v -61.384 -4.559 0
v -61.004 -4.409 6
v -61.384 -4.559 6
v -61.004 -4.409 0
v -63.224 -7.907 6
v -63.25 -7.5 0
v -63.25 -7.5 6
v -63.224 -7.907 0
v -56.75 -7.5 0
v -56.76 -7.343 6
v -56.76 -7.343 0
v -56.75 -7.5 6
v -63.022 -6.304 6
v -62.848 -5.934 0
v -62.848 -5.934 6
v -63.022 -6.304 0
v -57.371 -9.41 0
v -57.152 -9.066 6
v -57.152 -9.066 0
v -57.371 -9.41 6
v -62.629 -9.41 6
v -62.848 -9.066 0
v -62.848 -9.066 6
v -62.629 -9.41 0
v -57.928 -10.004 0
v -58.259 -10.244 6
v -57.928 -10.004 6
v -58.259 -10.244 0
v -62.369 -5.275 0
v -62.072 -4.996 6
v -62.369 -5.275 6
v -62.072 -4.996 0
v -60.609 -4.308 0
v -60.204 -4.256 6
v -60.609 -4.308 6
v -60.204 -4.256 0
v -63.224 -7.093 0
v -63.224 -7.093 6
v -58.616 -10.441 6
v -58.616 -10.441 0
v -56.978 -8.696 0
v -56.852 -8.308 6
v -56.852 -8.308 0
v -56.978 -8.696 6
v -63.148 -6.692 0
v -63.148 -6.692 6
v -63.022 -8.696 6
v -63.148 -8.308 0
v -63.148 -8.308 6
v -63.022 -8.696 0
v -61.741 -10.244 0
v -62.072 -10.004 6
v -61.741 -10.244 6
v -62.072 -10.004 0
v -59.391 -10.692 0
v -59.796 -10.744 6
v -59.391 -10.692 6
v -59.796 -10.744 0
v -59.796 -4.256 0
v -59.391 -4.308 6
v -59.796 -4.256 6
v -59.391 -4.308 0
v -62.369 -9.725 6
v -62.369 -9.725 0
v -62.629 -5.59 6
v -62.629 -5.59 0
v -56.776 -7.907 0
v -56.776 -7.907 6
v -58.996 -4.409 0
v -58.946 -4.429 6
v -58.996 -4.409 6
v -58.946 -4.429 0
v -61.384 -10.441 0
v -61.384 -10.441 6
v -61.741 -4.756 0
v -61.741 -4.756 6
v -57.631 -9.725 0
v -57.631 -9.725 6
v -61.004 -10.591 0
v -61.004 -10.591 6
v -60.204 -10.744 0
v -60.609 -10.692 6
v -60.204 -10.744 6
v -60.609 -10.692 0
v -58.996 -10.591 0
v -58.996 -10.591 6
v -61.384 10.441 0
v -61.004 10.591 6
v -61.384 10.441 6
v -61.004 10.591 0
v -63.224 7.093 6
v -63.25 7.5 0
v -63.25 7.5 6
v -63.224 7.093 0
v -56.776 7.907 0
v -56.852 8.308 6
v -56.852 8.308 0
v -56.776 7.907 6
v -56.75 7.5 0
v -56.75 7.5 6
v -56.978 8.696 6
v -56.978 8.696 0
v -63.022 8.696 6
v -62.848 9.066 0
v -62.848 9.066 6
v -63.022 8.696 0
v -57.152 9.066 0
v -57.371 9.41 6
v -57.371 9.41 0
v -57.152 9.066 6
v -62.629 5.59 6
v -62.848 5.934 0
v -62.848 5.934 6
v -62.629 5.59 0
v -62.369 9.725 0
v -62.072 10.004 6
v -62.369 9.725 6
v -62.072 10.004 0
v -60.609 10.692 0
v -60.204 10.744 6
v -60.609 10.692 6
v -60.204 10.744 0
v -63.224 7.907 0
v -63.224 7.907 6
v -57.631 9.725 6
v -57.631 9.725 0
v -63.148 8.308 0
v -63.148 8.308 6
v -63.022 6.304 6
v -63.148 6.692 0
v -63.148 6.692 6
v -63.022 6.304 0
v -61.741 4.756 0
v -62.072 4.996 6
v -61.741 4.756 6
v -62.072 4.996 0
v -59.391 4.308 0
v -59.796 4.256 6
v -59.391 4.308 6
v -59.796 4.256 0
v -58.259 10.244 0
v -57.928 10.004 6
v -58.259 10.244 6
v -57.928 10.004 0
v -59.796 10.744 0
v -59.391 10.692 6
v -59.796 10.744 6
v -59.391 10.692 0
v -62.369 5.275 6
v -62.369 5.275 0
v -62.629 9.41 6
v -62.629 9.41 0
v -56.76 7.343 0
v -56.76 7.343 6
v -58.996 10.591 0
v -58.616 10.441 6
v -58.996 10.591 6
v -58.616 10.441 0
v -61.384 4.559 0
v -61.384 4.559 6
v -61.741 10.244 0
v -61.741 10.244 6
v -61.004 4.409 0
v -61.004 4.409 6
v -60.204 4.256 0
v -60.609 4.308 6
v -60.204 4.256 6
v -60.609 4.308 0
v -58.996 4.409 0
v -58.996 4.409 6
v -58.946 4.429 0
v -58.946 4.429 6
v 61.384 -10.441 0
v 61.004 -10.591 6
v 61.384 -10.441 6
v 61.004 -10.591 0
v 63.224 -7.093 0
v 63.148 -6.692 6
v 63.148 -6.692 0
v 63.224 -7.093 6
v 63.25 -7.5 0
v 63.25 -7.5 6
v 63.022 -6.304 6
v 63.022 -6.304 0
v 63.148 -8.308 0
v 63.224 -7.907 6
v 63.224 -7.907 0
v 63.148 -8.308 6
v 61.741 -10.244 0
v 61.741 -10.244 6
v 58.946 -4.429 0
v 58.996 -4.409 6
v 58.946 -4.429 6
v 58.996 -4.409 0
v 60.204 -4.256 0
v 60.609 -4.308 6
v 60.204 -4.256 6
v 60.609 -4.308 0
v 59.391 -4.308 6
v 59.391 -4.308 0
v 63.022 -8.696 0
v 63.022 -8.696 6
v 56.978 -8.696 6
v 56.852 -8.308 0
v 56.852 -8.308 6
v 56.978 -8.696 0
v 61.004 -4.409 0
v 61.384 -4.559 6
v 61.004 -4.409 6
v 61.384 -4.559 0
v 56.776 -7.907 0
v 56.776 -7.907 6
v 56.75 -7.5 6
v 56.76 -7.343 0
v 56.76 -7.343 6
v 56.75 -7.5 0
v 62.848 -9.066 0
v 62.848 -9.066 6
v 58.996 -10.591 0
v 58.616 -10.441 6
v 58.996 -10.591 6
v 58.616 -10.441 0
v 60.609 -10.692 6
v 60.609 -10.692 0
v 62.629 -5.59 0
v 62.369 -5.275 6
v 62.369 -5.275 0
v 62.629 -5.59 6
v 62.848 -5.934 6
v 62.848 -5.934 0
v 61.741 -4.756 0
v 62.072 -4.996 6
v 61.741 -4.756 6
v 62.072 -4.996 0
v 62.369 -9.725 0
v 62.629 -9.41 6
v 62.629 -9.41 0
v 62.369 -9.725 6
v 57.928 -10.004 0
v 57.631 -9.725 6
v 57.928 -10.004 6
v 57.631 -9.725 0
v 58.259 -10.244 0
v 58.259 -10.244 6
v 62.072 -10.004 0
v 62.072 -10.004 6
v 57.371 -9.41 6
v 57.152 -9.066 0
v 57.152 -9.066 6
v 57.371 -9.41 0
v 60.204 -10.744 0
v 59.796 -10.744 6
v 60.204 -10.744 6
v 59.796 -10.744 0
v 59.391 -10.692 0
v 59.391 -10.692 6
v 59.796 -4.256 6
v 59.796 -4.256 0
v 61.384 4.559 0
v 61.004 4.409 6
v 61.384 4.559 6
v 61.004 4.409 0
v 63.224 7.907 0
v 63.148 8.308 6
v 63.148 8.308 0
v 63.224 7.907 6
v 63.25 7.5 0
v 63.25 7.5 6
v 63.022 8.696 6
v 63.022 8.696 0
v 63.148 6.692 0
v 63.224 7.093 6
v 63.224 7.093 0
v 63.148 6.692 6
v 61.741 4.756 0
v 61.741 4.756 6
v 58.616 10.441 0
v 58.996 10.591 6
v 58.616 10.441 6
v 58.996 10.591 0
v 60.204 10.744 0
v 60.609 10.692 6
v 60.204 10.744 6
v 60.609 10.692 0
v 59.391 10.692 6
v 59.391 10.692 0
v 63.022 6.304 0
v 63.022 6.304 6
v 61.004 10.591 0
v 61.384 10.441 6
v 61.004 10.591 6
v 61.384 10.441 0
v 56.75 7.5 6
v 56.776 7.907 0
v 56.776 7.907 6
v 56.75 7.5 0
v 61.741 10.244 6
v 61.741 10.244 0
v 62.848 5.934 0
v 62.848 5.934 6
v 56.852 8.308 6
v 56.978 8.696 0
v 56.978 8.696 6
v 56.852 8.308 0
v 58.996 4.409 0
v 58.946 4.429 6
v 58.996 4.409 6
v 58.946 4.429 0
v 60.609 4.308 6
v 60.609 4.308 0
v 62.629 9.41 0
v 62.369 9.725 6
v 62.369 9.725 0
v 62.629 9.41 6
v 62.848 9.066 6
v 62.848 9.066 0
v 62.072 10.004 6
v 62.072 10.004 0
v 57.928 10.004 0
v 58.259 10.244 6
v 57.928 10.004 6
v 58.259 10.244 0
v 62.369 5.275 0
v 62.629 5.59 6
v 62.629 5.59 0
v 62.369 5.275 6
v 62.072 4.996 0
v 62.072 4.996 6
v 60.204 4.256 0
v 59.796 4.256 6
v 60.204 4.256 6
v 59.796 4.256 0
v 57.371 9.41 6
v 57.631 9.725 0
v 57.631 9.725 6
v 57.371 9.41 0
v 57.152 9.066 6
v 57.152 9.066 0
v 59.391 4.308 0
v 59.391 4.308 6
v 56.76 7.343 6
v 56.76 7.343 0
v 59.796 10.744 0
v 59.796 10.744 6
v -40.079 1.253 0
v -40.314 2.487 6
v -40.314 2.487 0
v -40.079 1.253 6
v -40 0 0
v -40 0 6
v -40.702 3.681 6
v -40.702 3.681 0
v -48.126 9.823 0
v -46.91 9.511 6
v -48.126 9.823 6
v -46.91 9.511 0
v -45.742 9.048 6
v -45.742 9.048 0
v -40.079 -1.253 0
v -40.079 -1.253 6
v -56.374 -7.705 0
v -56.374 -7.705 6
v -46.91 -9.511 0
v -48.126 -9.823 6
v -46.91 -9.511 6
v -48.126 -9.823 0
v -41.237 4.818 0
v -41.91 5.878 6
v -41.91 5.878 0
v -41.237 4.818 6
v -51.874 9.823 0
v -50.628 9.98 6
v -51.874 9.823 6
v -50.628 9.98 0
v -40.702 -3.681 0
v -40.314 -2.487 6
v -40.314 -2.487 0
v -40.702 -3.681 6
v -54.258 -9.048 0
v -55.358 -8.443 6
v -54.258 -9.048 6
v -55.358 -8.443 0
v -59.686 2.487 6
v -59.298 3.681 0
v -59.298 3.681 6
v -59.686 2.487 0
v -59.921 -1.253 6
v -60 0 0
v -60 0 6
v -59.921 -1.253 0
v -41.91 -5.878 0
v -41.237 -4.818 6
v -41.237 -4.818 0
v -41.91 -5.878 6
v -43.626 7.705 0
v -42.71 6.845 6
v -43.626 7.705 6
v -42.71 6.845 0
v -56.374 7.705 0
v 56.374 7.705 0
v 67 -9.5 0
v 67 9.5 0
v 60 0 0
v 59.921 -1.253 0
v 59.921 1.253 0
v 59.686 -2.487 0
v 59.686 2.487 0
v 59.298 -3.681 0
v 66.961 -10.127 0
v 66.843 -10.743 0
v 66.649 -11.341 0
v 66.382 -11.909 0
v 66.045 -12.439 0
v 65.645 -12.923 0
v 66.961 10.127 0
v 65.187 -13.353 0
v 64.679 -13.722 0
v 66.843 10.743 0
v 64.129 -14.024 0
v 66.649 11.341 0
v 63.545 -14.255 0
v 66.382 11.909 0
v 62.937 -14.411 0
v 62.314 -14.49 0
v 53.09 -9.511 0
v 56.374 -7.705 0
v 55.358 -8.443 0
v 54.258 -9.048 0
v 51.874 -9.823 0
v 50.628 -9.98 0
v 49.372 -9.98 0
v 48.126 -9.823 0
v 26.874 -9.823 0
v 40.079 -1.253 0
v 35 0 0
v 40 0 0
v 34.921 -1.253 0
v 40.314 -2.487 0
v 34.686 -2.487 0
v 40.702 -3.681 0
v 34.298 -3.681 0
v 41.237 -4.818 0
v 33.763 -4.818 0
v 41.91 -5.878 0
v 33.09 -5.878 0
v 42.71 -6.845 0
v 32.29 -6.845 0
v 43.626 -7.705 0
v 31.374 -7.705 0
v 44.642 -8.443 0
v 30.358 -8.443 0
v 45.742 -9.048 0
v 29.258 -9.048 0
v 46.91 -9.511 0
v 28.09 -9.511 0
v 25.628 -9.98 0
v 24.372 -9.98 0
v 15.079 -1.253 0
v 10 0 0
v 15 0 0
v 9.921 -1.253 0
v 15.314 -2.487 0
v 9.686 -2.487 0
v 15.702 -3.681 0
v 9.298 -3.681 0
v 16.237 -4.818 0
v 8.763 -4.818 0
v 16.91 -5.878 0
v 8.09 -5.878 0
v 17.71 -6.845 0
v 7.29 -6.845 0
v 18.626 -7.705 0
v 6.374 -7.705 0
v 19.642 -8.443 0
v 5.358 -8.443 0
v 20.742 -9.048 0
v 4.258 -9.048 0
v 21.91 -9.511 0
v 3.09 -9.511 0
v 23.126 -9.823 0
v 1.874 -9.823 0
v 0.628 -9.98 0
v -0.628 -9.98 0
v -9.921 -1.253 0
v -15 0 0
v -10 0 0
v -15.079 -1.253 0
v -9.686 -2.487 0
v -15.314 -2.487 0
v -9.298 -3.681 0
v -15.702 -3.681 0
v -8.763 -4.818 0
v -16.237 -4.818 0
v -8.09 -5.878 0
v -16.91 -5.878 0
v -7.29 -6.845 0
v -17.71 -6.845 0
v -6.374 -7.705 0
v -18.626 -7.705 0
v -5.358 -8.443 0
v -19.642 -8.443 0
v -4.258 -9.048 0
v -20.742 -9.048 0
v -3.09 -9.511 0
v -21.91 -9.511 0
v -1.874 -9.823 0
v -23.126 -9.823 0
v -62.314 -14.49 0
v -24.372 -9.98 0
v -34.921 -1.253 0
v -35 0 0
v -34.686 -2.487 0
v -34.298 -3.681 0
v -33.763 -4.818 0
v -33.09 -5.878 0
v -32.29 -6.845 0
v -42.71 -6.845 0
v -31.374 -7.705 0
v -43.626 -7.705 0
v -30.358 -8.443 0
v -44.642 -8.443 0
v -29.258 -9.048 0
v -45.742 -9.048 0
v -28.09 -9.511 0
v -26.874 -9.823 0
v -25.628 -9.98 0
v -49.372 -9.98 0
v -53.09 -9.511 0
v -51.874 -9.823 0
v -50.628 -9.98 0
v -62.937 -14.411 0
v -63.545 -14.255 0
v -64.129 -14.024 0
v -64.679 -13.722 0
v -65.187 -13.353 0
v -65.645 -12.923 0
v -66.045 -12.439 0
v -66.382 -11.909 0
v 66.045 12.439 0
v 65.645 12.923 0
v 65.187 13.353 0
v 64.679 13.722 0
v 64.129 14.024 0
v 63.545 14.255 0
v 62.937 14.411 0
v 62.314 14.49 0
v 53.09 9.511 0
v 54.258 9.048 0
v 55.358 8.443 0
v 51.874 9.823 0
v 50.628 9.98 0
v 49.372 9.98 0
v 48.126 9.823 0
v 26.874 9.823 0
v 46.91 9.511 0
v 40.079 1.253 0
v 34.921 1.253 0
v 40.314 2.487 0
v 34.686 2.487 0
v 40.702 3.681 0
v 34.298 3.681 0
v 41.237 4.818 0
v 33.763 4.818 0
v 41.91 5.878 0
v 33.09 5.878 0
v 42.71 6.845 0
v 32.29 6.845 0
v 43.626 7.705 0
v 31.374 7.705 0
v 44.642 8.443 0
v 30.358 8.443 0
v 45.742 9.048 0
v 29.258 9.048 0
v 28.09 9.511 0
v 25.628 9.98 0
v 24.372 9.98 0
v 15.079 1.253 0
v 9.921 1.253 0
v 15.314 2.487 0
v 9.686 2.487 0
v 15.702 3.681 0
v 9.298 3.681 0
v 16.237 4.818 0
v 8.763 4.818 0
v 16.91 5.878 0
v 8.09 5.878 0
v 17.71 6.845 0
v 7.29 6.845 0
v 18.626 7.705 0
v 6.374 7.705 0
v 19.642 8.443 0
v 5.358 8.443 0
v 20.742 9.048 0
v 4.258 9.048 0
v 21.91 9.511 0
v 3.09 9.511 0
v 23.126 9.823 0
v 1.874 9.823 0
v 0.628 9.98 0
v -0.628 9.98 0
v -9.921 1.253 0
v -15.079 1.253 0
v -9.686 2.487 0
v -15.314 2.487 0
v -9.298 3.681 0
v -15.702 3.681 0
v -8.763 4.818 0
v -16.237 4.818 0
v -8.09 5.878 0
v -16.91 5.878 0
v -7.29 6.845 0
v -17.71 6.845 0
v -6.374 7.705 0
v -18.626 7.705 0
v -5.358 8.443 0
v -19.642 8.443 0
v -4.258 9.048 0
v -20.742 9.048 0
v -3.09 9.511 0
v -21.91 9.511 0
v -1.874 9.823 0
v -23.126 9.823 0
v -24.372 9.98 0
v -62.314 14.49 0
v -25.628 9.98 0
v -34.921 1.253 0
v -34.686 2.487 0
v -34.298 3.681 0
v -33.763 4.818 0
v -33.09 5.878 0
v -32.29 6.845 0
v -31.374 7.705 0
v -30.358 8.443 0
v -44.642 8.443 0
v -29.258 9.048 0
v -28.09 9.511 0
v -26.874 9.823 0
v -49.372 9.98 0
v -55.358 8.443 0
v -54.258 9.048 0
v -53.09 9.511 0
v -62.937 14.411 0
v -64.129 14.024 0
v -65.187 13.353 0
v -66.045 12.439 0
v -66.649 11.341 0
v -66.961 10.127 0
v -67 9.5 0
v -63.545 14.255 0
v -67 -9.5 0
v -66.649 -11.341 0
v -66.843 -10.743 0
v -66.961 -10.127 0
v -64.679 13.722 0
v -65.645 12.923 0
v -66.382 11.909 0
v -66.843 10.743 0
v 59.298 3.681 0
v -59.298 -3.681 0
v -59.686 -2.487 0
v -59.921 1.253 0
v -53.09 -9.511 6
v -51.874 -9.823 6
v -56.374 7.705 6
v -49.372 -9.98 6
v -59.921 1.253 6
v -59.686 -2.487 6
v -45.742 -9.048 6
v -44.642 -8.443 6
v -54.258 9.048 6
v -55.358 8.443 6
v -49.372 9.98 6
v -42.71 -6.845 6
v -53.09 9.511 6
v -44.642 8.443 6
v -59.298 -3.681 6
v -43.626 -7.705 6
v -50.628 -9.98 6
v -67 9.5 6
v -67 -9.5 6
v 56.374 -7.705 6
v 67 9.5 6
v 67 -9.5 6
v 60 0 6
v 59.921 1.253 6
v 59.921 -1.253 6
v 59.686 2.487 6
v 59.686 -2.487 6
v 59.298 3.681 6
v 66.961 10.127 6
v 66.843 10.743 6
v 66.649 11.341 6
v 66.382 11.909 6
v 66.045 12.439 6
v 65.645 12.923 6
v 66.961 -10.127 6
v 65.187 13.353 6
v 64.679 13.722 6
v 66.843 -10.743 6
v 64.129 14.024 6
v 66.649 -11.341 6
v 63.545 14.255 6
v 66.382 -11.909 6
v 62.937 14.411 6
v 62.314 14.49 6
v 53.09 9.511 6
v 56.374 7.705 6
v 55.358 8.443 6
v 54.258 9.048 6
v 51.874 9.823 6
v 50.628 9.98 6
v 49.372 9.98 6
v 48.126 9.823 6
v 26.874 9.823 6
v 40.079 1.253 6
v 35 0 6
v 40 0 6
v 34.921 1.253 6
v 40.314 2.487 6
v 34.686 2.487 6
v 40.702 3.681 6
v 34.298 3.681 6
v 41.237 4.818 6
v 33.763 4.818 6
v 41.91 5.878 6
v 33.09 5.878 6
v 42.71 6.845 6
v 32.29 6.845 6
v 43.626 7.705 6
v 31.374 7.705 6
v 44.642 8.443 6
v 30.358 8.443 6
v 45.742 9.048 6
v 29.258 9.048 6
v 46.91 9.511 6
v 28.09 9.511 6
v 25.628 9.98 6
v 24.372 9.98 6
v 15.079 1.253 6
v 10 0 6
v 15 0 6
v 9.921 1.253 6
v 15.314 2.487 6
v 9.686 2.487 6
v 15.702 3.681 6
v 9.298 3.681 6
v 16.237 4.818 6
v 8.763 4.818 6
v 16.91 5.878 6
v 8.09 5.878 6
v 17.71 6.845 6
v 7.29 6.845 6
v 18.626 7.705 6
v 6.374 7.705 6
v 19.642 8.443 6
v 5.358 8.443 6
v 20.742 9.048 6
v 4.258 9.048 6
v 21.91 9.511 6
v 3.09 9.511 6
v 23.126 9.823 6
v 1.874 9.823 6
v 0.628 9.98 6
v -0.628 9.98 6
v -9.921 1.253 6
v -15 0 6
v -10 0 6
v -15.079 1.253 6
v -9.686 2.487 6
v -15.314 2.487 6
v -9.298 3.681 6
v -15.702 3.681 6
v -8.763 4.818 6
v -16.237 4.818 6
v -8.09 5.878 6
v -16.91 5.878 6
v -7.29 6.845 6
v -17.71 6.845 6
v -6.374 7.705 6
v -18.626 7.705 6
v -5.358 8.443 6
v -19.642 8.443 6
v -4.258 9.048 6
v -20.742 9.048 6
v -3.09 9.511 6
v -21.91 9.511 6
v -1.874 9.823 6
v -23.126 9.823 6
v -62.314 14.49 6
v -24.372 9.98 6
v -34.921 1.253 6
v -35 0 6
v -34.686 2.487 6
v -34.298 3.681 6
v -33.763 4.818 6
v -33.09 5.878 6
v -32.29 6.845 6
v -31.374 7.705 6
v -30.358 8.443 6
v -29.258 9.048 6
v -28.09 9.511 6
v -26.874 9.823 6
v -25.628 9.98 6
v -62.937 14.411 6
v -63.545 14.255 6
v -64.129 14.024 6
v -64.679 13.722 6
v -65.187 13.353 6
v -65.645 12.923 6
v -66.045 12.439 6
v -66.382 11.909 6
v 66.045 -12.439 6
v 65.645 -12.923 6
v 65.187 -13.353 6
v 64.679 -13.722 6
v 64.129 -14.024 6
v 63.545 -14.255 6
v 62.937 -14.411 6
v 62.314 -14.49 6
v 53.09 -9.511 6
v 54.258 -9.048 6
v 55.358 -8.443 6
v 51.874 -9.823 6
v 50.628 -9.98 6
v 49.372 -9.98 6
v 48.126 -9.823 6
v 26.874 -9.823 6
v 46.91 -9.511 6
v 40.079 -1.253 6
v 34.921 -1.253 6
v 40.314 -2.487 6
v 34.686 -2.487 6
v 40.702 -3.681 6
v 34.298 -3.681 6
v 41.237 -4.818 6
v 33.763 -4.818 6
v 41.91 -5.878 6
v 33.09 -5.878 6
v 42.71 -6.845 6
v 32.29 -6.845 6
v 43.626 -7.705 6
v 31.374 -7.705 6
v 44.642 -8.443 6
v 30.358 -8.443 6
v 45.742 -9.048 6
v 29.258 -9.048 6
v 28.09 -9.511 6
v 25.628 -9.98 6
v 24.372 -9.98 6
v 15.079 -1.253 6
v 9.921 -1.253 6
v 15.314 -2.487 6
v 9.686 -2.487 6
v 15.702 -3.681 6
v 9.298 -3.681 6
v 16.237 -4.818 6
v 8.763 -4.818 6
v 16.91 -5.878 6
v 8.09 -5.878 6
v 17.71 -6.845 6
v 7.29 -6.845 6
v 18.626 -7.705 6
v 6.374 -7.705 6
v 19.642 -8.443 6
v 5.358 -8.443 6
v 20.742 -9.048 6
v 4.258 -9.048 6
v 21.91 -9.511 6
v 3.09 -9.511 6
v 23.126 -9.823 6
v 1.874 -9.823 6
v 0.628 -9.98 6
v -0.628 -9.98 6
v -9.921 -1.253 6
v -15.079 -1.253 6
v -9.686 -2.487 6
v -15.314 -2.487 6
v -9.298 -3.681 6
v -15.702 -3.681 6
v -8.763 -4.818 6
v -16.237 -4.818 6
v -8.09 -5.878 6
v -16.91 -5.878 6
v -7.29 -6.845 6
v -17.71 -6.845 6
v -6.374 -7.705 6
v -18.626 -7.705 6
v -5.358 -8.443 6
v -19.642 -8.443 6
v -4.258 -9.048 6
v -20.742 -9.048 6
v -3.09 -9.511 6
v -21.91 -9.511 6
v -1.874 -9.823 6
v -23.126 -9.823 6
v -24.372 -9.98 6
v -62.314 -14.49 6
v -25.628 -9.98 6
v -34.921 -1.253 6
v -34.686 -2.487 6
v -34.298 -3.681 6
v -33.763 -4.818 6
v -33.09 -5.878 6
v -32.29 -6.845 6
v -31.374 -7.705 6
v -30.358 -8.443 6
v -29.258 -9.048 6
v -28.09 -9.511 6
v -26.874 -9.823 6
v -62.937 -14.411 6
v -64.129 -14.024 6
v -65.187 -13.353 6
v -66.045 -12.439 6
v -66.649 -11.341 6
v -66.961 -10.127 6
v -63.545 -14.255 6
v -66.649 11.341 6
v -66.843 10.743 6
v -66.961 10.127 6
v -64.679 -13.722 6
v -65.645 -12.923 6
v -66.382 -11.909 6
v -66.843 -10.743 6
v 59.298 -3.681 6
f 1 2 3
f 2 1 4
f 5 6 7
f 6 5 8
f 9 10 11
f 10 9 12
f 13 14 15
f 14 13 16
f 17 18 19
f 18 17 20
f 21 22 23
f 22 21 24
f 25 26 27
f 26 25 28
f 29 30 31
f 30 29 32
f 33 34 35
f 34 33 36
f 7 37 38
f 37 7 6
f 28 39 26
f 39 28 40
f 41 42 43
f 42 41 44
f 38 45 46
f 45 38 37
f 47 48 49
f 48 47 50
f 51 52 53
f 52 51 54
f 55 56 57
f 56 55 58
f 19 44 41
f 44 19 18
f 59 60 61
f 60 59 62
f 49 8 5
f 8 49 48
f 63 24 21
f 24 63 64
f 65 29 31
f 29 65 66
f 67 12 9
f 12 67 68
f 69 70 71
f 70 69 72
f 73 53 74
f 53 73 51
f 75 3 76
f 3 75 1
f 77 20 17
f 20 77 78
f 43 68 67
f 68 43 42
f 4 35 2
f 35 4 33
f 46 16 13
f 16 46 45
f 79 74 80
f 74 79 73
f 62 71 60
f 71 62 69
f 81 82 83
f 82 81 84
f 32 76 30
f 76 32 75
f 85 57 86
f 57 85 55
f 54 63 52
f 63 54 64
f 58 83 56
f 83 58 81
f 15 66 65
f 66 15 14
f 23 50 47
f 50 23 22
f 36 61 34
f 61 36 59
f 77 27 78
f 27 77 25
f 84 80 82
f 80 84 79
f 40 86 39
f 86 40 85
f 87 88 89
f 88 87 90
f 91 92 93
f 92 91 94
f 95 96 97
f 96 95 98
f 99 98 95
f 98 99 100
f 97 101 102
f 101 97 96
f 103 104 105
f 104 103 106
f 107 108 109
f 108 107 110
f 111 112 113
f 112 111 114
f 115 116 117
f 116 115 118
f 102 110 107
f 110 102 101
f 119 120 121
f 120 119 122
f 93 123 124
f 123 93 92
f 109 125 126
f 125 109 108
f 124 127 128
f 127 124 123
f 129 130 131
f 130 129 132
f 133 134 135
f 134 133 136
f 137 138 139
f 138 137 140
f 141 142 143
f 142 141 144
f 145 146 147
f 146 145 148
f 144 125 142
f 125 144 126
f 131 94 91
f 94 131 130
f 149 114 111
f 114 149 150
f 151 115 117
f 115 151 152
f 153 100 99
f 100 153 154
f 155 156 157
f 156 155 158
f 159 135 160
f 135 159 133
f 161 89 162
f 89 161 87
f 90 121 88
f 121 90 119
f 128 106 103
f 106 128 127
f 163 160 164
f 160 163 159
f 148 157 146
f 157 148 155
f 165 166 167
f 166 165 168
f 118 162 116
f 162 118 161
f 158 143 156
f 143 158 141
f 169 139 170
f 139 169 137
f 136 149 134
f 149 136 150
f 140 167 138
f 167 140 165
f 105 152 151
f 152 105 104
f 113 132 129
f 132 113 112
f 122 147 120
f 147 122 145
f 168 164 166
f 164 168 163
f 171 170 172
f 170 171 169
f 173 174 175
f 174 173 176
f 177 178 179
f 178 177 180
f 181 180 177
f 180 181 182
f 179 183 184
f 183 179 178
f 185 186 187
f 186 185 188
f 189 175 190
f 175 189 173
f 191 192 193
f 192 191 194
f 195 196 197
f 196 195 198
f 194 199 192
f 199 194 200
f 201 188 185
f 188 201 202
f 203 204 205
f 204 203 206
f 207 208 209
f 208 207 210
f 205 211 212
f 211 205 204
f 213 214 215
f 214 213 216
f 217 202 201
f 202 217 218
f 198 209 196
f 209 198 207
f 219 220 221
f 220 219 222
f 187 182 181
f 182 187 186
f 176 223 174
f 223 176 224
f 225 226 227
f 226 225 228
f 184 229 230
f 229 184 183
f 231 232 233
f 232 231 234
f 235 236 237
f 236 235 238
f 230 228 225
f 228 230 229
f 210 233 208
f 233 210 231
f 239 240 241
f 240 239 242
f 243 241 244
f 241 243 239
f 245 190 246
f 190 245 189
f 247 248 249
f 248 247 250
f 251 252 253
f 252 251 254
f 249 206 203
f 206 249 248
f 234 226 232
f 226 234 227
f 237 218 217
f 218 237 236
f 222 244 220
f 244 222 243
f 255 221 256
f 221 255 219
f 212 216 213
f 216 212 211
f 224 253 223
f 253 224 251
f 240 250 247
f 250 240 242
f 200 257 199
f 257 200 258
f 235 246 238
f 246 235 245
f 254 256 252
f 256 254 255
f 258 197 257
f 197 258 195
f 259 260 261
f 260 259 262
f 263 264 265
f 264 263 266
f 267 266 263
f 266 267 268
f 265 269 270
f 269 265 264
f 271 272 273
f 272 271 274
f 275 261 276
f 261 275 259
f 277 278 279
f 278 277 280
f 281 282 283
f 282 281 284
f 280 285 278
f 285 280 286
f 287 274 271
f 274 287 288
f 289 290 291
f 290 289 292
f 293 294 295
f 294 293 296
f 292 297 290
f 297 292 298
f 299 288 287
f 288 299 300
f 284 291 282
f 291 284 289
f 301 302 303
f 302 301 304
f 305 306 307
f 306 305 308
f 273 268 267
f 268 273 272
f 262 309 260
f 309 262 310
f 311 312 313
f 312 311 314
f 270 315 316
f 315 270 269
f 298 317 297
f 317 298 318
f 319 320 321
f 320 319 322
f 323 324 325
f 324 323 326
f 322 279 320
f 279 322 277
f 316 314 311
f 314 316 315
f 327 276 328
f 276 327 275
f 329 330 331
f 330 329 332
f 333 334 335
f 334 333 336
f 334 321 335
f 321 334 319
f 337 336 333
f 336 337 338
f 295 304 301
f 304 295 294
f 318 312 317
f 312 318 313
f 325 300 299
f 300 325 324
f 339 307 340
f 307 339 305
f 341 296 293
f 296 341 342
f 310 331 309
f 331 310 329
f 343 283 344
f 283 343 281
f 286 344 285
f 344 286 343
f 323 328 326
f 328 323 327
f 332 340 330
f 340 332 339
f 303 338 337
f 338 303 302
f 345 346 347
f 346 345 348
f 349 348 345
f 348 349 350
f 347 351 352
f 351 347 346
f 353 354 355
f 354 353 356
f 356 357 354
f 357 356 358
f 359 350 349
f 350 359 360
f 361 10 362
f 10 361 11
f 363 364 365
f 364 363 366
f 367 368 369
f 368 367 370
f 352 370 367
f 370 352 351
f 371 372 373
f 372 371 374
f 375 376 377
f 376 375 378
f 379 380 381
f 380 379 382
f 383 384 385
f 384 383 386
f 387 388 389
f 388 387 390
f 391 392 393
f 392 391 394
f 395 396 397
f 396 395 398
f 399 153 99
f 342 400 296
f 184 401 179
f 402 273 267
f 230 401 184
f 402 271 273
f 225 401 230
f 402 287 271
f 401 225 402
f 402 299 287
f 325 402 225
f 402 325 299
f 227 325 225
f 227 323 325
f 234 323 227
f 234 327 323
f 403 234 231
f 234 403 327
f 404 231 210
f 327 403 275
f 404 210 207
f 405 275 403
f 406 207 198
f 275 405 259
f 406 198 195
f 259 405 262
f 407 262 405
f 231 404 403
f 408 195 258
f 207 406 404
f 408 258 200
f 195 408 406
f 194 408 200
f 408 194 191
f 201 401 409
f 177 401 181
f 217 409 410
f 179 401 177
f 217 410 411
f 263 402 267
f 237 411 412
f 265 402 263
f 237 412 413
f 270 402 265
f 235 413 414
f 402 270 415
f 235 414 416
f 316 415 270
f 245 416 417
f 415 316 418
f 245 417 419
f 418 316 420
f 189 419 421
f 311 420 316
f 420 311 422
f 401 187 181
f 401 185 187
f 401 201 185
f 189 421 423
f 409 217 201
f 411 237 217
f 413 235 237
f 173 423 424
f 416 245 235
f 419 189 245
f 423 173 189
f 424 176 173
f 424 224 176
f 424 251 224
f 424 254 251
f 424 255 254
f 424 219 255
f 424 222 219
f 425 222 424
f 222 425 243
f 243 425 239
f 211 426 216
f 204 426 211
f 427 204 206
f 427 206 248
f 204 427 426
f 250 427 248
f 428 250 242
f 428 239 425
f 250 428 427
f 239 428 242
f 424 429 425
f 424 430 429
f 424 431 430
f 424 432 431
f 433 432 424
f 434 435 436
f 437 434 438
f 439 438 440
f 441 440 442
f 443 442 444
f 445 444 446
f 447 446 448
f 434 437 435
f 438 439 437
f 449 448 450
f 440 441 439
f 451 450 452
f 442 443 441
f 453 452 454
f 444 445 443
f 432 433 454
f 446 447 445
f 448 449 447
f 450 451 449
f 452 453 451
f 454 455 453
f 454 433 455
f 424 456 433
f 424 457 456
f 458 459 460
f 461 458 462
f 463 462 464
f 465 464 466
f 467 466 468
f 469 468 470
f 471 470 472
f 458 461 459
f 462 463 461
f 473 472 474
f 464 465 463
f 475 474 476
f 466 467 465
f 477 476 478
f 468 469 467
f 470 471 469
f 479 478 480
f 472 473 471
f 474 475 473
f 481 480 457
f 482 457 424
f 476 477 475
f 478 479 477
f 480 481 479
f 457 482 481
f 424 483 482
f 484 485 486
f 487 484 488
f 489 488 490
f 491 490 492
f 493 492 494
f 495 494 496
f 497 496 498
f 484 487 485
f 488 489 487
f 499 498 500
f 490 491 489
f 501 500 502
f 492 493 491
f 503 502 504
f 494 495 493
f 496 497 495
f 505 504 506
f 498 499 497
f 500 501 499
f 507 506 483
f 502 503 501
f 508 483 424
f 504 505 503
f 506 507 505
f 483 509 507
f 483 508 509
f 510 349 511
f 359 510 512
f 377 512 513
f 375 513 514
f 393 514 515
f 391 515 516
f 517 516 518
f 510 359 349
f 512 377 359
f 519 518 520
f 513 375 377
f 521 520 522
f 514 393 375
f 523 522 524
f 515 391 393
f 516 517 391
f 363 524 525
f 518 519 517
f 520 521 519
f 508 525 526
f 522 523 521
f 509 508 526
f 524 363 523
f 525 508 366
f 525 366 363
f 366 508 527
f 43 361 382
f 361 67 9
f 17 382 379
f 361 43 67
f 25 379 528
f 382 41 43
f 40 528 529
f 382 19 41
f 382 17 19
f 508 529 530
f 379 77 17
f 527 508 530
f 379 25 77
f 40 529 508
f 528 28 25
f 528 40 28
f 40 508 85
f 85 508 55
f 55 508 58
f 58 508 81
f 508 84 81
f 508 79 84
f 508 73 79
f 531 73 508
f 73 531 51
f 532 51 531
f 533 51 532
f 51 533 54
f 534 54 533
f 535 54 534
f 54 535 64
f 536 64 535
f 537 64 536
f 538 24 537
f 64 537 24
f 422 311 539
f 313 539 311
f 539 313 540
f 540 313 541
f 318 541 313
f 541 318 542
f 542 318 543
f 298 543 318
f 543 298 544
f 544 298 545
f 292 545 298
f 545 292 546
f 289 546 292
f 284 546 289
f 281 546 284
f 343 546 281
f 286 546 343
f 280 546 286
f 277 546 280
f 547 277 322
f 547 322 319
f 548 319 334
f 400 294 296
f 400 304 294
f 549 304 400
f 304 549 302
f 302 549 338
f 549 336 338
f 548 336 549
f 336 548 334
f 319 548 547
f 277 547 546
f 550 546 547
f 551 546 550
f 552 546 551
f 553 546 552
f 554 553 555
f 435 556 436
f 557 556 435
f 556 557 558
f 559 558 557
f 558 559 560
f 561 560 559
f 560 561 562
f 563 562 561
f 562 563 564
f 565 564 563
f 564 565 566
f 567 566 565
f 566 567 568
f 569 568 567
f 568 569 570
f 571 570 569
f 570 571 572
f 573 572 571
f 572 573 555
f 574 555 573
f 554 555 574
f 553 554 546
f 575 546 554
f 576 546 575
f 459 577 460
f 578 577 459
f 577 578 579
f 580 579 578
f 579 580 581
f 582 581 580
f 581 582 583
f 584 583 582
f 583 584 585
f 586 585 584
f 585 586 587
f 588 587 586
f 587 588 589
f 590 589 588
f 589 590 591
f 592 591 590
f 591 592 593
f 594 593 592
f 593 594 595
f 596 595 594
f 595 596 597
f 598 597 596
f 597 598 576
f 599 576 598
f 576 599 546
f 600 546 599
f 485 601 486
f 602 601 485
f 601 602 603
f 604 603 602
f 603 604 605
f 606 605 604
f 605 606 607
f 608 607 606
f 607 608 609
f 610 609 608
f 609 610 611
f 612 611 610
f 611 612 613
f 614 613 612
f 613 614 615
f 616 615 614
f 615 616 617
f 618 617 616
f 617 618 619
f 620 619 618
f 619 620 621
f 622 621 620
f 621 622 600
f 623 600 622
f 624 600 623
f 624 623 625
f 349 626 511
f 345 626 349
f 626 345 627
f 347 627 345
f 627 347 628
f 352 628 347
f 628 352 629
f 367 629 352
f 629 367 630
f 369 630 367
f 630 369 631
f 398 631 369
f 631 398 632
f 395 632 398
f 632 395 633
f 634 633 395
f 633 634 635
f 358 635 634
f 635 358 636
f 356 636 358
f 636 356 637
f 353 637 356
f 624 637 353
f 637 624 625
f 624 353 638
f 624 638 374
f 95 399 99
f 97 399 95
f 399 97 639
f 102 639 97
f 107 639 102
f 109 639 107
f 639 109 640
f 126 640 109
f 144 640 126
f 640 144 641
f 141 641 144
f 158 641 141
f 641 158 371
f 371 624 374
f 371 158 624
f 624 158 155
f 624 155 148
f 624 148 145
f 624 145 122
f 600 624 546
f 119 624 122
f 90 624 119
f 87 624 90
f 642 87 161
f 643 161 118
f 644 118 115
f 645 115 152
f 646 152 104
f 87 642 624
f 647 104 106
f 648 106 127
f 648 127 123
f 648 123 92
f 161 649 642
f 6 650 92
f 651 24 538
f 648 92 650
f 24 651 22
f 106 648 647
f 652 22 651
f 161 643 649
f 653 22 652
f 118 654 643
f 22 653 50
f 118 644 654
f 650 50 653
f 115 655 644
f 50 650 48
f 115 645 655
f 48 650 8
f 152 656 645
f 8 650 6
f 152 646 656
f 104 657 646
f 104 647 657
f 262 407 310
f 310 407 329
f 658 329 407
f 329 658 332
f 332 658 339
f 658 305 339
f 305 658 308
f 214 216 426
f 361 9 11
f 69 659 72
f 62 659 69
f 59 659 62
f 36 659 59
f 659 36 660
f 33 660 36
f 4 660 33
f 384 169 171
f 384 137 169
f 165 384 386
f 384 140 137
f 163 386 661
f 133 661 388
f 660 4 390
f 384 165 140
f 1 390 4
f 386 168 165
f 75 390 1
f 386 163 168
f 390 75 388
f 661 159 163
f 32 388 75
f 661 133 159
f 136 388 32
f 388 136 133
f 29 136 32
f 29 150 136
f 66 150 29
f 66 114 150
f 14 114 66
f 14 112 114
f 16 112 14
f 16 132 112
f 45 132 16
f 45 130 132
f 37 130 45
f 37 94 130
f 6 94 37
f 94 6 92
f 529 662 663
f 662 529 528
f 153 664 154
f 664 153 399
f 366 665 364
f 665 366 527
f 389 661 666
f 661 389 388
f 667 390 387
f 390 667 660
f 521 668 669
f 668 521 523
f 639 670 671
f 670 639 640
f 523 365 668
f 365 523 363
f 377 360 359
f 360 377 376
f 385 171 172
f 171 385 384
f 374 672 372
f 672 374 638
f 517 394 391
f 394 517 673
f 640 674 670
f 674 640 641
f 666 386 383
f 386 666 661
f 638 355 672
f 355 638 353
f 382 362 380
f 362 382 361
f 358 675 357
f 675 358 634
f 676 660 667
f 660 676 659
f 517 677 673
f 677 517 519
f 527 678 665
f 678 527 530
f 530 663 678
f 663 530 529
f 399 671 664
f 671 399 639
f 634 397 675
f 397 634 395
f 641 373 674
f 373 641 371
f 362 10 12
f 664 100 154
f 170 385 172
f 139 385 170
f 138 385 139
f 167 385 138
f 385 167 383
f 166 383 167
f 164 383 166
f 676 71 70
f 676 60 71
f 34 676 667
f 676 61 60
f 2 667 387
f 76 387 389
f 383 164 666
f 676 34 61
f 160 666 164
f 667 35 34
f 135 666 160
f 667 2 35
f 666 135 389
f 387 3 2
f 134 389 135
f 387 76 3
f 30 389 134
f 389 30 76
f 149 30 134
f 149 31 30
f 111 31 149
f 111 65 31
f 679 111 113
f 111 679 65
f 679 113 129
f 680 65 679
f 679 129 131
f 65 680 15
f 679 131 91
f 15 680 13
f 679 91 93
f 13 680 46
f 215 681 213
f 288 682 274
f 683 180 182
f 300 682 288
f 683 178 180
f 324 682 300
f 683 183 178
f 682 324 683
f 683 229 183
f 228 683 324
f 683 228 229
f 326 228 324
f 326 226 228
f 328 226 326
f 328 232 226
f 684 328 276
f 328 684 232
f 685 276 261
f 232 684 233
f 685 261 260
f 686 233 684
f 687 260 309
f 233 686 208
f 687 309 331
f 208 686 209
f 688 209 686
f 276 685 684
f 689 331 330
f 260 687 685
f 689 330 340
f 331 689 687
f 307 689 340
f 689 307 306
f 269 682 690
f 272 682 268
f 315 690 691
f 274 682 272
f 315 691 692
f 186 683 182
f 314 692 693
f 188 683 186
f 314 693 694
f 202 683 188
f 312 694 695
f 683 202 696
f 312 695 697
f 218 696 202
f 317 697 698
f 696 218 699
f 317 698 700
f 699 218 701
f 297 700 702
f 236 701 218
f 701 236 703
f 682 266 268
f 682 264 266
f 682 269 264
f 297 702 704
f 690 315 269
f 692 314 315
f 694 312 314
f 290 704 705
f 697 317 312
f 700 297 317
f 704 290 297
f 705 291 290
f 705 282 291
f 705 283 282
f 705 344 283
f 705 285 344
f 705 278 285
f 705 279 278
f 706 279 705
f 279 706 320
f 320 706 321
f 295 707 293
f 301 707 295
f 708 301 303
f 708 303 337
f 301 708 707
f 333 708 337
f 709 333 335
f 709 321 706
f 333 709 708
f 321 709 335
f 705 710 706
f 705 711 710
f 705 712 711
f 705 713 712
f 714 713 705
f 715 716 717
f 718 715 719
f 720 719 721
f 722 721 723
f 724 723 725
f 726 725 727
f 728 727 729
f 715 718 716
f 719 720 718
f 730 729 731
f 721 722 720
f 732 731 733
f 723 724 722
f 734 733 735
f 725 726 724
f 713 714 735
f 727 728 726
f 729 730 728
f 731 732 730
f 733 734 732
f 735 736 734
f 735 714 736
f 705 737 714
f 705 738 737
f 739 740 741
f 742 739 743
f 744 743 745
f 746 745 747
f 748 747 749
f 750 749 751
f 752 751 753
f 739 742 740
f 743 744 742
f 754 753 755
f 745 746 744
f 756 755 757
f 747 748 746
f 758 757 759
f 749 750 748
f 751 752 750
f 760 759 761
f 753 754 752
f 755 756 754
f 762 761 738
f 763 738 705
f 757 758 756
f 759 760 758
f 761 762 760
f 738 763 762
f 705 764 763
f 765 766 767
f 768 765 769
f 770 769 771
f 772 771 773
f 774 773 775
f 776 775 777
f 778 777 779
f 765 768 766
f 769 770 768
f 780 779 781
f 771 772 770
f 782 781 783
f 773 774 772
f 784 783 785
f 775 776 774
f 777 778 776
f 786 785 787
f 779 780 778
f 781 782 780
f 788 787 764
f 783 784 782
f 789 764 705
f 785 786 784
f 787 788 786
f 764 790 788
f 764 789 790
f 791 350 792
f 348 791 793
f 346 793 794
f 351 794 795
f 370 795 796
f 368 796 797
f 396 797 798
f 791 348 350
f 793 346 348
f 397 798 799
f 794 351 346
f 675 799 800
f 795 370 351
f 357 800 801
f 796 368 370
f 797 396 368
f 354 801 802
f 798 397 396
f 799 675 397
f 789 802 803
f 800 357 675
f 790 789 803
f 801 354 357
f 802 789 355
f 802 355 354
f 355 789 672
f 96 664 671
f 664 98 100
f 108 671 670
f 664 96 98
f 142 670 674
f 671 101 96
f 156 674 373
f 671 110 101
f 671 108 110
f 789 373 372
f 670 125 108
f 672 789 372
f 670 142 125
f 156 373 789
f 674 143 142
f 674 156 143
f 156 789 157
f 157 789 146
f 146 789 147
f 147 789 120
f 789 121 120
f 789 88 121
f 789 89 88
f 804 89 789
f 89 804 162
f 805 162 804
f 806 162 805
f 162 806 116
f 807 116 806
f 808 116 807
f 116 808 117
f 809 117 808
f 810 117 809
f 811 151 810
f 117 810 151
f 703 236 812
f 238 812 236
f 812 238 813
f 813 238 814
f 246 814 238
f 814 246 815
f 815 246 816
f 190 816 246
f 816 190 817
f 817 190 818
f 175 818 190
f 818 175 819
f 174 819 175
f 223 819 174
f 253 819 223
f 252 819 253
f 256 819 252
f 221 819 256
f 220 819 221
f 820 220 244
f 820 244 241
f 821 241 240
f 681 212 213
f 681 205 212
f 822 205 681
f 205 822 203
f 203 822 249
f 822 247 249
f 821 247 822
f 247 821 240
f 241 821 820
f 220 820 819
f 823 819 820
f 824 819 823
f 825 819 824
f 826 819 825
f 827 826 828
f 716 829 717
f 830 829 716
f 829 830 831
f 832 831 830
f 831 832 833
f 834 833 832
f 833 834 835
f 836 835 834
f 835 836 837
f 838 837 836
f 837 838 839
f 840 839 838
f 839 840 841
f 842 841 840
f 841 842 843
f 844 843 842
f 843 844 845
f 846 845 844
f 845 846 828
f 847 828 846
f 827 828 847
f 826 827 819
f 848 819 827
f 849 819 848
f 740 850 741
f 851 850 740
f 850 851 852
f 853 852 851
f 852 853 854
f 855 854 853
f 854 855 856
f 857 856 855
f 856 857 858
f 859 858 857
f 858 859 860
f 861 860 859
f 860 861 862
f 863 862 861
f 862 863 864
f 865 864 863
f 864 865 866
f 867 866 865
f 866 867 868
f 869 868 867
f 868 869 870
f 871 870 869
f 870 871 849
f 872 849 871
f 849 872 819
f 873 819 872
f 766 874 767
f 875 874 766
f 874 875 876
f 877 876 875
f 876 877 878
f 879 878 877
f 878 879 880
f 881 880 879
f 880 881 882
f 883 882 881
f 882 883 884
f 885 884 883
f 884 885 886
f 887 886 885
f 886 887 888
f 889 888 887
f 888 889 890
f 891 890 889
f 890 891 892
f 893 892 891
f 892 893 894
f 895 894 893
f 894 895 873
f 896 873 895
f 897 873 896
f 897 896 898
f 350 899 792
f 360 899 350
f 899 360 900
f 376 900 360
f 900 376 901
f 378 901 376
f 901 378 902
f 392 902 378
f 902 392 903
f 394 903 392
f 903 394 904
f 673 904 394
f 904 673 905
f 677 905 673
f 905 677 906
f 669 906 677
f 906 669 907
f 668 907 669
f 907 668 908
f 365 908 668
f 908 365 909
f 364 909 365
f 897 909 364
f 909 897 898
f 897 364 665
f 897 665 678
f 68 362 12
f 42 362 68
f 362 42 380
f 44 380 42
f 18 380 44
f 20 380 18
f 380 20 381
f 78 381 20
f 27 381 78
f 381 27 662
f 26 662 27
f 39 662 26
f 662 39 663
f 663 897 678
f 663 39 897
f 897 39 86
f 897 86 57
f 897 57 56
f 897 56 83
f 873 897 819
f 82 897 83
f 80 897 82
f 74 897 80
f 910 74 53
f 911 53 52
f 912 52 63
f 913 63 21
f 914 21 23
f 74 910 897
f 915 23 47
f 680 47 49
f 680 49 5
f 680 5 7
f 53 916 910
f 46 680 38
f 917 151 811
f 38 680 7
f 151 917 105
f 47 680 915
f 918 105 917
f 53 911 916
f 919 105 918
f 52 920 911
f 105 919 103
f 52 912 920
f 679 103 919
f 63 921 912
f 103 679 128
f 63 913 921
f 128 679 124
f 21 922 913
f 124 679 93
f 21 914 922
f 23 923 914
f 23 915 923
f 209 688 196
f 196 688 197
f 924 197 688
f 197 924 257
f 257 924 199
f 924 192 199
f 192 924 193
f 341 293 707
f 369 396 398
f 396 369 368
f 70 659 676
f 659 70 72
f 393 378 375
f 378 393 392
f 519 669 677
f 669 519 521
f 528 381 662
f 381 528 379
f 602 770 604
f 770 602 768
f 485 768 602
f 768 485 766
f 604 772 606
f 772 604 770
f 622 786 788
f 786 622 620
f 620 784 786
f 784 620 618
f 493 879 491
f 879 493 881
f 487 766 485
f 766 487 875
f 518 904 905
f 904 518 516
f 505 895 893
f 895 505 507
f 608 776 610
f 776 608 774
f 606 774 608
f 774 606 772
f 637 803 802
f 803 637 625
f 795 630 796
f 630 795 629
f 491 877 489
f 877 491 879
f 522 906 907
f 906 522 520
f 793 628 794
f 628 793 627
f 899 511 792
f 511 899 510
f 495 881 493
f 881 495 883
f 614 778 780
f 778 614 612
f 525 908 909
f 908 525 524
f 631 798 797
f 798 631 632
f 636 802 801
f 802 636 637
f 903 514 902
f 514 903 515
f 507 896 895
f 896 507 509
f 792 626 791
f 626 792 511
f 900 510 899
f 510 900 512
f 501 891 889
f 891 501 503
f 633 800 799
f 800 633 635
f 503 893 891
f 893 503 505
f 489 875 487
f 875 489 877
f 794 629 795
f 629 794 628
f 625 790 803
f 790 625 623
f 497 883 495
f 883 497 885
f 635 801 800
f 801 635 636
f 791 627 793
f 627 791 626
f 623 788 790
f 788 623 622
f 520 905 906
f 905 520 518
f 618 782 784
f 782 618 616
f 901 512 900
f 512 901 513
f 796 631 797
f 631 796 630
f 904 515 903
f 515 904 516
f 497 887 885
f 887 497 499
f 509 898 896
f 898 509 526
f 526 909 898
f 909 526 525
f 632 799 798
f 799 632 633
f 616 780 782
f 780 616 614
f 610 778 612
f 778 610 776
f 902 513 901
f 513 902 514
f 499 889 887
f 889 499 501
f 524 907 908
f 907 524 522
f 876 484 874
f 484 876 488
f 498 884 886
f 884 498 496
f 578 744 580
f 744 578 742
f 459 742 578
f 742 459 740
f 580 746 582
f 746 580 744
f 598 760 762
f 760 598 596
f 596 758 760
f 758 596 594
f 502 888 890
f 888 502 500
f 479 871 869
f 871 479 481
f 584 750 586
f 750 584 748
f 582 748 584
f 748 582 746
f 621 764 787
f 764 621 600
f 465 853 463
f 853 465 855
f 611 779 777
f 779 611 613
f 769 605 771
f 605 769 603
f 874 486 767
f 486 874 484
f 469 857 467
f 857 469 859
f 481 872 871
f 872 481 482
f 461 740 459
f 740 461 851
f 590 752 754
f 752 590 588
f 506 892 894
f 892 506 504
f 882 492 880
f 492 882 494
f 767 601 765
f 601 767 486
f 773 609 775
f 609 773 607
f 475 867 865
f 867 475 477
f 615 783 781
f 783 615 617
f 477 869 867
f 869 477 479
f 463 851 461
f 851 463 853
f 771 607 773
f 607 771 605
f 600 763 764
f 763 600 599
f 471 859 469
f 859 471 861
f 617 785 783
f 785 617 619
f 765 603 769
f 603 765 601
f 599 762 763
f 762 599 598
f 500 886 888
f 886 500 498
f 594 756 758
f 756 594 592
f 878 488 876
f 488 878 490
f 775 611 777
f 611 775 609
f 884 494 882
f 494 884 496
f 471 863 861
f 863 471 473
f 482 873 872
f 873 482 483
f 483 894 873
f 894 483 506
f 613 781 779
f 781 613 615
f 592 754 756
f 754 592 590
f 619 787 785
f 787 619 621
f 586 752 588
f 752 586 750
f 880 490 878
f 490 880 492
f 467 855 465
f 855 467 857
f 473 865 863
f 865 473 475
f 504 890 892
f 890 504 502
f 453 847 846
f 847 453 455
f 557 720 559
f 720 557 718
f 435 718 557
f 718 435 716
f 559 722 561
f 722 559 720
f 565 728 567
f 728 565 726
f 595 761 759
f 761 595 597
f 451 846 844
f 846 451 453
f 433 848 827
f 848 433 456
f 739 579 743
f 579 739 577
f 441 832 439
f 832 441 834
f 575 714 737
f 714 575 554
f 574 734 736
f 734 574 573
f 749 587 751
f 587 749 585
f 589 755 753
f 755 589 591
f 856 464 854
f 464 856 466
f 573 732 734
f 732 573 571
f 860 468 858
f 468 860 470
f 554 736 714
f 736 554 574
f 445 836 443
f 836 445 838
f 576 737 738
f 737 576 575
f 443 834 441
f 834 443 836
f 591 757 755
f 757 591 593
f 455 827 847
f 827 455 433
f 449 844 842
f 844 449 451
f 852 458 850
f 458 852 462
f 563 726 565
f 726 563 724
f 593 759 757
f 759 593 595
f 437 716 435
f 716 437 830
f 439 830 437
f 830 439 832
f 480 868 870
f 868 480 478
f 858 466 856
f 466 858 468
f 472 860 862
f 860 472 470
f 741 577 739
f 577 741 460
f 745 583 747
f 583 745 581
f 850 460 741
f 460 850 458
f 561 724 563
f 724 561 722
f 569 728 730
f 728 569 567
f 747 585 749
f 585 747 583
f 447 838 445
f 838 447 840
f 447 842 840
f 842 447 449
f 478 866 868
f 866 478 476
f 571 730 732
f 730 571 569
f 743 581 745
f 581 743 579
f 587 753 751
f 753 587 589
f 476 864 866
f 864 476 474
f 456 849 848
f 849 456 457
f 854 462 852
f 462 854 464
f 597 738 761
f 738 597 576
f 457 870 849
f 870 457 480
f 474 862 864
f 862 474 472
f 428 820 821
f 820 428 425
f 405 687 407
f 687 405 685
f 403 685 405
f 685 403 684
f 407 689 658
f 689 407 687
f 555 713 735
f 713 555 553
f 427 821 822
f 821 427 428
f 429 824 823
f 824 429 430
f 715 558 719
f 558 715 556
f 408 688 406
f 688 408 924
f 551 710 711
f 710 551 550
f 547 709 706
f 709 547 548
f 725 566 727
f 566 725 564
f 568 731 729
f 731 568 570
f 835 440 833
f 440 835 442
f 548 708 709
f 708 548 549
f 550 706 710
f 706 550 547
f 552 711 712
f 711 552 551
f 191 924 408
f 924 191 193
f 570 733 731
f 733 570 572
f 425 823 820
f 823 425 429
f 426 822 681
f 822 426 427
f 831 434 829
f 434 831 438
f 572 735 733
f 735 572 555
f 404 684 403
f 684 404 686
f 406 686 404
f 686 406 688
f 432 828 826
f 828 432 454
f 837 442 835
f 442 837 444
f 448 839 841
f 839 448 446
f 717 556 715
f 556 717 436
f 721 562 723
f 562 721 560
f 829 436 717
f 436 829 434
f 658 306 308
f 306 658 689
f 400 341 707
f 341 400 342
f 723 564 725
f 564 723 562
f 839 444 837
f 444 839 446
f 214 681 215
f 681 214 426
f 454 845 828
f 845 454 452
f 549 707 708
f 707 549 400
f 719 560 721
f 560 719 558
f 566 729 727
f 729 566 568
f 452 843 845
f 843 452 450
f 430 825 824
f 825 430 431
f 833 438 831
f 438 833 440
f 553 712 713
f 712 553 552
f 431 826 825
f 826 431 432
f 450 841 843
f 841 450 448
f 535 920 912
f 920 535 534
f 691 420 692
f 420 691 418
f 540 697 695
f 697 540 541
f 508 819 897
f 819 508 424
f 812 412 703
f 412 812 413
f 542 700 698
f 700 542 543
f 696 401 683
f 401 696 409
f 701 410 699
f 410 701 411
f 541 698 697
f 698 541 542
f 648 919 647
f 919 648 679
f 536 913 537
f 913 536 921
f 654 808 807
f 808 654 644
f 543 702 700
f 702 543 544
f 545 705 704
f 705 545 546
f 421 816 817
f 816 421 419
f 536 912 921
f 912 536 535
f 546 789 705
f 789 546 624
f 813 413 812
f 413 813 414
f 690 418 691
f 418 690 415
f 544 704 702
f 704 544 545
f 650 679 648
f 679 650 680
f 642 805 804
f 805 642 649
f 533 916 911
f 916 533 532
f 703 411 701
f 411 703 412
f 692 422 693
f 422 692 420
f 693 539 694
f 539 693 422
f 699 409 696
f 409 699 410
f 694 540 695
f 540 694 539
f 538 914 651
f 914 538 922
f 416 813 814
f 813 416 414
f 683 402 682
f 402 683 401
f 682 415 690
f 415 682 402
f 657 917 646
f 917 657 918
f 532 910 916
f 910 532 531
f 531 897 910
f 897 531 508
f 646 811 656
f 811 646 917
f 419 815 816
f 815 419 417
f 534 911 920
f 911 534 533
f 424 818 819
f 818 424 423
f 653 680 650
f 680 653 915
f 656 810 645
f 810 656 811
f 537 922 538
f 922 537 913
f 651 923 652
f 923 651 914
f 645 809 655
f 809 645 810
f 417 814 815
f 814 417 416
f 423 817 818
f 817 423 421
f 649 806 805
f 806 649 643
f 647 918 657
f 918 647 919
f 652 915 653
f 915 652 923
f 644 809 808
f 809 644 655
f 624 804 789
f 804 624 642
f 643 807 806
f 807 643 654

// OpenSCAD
$fn = 50;

difference() {
	union() {
		hull() {
			translate(v = [-62.0, 9.5, 0]) {
				cylinder(h = 6, r = 5);
			}
			translate(v = [62.0, 9.5, 0]) {
				cylinder(h = 6, r = 5);
			}
			translate(v = [-62.0, -9.5, 0]) {
				cylinder(h = 6, r = 5);
			}
			translate(v = [62.0, -9.5, 0]) {
				cylinder(h = 6, r = 5);
			}
		}
	}
	union() {
		translate(v = [-60.0, -7.5, -100.0]) {
			cylinder(h = 200, r = 3.25);
		}
		translate(v = [-60.0, 7.5, -100.0]) {
			cylinder(h = 200, r = 3.25);
		}
		translate(v = [60.0, -7.5, -100.0]) {
			cylinder(h = 200, r = 3.25);
		}
		translate(v = [60.0, 7.5, -100.0]) {
			cylinder(h = 200, r = 3.25);
		}
		translate(v = [-60.0, -7.5, -100.0]) {
			cylinder(h = 200, r = 1.8);
		}
		translate(v = [-60.0, 7.5, -100.0]) {
			cylinder(h = 200, r = 1.8);
		}
		translate(v = [60.0, -7.5, -100.0]) {
			cylinder(h = 200, r = 1.8);
		}
		translate(v = [60.0, 7.5, -100.0]) {
			cylinder(h = 200, r = 1.8);
		}
		translate(v = [-50.0, 0, 0.0]) {
			cylinder(h = 6, r = 10.0);
		}
		translate(v = [-25.0, 0, 0.0]) {
			cylinder(h = 6, r = 10.0);
		}
		cylinder(h = 6, r = 10.0);
		translate(v = [25.0, 0, 0.0]) {
			cylinder(h = 6, r = 10.0);
		}
		translate(v = [50.0, 0, 0.0]) {
			cylinder(h = 6, r = 10.0);
		}
	}
}
